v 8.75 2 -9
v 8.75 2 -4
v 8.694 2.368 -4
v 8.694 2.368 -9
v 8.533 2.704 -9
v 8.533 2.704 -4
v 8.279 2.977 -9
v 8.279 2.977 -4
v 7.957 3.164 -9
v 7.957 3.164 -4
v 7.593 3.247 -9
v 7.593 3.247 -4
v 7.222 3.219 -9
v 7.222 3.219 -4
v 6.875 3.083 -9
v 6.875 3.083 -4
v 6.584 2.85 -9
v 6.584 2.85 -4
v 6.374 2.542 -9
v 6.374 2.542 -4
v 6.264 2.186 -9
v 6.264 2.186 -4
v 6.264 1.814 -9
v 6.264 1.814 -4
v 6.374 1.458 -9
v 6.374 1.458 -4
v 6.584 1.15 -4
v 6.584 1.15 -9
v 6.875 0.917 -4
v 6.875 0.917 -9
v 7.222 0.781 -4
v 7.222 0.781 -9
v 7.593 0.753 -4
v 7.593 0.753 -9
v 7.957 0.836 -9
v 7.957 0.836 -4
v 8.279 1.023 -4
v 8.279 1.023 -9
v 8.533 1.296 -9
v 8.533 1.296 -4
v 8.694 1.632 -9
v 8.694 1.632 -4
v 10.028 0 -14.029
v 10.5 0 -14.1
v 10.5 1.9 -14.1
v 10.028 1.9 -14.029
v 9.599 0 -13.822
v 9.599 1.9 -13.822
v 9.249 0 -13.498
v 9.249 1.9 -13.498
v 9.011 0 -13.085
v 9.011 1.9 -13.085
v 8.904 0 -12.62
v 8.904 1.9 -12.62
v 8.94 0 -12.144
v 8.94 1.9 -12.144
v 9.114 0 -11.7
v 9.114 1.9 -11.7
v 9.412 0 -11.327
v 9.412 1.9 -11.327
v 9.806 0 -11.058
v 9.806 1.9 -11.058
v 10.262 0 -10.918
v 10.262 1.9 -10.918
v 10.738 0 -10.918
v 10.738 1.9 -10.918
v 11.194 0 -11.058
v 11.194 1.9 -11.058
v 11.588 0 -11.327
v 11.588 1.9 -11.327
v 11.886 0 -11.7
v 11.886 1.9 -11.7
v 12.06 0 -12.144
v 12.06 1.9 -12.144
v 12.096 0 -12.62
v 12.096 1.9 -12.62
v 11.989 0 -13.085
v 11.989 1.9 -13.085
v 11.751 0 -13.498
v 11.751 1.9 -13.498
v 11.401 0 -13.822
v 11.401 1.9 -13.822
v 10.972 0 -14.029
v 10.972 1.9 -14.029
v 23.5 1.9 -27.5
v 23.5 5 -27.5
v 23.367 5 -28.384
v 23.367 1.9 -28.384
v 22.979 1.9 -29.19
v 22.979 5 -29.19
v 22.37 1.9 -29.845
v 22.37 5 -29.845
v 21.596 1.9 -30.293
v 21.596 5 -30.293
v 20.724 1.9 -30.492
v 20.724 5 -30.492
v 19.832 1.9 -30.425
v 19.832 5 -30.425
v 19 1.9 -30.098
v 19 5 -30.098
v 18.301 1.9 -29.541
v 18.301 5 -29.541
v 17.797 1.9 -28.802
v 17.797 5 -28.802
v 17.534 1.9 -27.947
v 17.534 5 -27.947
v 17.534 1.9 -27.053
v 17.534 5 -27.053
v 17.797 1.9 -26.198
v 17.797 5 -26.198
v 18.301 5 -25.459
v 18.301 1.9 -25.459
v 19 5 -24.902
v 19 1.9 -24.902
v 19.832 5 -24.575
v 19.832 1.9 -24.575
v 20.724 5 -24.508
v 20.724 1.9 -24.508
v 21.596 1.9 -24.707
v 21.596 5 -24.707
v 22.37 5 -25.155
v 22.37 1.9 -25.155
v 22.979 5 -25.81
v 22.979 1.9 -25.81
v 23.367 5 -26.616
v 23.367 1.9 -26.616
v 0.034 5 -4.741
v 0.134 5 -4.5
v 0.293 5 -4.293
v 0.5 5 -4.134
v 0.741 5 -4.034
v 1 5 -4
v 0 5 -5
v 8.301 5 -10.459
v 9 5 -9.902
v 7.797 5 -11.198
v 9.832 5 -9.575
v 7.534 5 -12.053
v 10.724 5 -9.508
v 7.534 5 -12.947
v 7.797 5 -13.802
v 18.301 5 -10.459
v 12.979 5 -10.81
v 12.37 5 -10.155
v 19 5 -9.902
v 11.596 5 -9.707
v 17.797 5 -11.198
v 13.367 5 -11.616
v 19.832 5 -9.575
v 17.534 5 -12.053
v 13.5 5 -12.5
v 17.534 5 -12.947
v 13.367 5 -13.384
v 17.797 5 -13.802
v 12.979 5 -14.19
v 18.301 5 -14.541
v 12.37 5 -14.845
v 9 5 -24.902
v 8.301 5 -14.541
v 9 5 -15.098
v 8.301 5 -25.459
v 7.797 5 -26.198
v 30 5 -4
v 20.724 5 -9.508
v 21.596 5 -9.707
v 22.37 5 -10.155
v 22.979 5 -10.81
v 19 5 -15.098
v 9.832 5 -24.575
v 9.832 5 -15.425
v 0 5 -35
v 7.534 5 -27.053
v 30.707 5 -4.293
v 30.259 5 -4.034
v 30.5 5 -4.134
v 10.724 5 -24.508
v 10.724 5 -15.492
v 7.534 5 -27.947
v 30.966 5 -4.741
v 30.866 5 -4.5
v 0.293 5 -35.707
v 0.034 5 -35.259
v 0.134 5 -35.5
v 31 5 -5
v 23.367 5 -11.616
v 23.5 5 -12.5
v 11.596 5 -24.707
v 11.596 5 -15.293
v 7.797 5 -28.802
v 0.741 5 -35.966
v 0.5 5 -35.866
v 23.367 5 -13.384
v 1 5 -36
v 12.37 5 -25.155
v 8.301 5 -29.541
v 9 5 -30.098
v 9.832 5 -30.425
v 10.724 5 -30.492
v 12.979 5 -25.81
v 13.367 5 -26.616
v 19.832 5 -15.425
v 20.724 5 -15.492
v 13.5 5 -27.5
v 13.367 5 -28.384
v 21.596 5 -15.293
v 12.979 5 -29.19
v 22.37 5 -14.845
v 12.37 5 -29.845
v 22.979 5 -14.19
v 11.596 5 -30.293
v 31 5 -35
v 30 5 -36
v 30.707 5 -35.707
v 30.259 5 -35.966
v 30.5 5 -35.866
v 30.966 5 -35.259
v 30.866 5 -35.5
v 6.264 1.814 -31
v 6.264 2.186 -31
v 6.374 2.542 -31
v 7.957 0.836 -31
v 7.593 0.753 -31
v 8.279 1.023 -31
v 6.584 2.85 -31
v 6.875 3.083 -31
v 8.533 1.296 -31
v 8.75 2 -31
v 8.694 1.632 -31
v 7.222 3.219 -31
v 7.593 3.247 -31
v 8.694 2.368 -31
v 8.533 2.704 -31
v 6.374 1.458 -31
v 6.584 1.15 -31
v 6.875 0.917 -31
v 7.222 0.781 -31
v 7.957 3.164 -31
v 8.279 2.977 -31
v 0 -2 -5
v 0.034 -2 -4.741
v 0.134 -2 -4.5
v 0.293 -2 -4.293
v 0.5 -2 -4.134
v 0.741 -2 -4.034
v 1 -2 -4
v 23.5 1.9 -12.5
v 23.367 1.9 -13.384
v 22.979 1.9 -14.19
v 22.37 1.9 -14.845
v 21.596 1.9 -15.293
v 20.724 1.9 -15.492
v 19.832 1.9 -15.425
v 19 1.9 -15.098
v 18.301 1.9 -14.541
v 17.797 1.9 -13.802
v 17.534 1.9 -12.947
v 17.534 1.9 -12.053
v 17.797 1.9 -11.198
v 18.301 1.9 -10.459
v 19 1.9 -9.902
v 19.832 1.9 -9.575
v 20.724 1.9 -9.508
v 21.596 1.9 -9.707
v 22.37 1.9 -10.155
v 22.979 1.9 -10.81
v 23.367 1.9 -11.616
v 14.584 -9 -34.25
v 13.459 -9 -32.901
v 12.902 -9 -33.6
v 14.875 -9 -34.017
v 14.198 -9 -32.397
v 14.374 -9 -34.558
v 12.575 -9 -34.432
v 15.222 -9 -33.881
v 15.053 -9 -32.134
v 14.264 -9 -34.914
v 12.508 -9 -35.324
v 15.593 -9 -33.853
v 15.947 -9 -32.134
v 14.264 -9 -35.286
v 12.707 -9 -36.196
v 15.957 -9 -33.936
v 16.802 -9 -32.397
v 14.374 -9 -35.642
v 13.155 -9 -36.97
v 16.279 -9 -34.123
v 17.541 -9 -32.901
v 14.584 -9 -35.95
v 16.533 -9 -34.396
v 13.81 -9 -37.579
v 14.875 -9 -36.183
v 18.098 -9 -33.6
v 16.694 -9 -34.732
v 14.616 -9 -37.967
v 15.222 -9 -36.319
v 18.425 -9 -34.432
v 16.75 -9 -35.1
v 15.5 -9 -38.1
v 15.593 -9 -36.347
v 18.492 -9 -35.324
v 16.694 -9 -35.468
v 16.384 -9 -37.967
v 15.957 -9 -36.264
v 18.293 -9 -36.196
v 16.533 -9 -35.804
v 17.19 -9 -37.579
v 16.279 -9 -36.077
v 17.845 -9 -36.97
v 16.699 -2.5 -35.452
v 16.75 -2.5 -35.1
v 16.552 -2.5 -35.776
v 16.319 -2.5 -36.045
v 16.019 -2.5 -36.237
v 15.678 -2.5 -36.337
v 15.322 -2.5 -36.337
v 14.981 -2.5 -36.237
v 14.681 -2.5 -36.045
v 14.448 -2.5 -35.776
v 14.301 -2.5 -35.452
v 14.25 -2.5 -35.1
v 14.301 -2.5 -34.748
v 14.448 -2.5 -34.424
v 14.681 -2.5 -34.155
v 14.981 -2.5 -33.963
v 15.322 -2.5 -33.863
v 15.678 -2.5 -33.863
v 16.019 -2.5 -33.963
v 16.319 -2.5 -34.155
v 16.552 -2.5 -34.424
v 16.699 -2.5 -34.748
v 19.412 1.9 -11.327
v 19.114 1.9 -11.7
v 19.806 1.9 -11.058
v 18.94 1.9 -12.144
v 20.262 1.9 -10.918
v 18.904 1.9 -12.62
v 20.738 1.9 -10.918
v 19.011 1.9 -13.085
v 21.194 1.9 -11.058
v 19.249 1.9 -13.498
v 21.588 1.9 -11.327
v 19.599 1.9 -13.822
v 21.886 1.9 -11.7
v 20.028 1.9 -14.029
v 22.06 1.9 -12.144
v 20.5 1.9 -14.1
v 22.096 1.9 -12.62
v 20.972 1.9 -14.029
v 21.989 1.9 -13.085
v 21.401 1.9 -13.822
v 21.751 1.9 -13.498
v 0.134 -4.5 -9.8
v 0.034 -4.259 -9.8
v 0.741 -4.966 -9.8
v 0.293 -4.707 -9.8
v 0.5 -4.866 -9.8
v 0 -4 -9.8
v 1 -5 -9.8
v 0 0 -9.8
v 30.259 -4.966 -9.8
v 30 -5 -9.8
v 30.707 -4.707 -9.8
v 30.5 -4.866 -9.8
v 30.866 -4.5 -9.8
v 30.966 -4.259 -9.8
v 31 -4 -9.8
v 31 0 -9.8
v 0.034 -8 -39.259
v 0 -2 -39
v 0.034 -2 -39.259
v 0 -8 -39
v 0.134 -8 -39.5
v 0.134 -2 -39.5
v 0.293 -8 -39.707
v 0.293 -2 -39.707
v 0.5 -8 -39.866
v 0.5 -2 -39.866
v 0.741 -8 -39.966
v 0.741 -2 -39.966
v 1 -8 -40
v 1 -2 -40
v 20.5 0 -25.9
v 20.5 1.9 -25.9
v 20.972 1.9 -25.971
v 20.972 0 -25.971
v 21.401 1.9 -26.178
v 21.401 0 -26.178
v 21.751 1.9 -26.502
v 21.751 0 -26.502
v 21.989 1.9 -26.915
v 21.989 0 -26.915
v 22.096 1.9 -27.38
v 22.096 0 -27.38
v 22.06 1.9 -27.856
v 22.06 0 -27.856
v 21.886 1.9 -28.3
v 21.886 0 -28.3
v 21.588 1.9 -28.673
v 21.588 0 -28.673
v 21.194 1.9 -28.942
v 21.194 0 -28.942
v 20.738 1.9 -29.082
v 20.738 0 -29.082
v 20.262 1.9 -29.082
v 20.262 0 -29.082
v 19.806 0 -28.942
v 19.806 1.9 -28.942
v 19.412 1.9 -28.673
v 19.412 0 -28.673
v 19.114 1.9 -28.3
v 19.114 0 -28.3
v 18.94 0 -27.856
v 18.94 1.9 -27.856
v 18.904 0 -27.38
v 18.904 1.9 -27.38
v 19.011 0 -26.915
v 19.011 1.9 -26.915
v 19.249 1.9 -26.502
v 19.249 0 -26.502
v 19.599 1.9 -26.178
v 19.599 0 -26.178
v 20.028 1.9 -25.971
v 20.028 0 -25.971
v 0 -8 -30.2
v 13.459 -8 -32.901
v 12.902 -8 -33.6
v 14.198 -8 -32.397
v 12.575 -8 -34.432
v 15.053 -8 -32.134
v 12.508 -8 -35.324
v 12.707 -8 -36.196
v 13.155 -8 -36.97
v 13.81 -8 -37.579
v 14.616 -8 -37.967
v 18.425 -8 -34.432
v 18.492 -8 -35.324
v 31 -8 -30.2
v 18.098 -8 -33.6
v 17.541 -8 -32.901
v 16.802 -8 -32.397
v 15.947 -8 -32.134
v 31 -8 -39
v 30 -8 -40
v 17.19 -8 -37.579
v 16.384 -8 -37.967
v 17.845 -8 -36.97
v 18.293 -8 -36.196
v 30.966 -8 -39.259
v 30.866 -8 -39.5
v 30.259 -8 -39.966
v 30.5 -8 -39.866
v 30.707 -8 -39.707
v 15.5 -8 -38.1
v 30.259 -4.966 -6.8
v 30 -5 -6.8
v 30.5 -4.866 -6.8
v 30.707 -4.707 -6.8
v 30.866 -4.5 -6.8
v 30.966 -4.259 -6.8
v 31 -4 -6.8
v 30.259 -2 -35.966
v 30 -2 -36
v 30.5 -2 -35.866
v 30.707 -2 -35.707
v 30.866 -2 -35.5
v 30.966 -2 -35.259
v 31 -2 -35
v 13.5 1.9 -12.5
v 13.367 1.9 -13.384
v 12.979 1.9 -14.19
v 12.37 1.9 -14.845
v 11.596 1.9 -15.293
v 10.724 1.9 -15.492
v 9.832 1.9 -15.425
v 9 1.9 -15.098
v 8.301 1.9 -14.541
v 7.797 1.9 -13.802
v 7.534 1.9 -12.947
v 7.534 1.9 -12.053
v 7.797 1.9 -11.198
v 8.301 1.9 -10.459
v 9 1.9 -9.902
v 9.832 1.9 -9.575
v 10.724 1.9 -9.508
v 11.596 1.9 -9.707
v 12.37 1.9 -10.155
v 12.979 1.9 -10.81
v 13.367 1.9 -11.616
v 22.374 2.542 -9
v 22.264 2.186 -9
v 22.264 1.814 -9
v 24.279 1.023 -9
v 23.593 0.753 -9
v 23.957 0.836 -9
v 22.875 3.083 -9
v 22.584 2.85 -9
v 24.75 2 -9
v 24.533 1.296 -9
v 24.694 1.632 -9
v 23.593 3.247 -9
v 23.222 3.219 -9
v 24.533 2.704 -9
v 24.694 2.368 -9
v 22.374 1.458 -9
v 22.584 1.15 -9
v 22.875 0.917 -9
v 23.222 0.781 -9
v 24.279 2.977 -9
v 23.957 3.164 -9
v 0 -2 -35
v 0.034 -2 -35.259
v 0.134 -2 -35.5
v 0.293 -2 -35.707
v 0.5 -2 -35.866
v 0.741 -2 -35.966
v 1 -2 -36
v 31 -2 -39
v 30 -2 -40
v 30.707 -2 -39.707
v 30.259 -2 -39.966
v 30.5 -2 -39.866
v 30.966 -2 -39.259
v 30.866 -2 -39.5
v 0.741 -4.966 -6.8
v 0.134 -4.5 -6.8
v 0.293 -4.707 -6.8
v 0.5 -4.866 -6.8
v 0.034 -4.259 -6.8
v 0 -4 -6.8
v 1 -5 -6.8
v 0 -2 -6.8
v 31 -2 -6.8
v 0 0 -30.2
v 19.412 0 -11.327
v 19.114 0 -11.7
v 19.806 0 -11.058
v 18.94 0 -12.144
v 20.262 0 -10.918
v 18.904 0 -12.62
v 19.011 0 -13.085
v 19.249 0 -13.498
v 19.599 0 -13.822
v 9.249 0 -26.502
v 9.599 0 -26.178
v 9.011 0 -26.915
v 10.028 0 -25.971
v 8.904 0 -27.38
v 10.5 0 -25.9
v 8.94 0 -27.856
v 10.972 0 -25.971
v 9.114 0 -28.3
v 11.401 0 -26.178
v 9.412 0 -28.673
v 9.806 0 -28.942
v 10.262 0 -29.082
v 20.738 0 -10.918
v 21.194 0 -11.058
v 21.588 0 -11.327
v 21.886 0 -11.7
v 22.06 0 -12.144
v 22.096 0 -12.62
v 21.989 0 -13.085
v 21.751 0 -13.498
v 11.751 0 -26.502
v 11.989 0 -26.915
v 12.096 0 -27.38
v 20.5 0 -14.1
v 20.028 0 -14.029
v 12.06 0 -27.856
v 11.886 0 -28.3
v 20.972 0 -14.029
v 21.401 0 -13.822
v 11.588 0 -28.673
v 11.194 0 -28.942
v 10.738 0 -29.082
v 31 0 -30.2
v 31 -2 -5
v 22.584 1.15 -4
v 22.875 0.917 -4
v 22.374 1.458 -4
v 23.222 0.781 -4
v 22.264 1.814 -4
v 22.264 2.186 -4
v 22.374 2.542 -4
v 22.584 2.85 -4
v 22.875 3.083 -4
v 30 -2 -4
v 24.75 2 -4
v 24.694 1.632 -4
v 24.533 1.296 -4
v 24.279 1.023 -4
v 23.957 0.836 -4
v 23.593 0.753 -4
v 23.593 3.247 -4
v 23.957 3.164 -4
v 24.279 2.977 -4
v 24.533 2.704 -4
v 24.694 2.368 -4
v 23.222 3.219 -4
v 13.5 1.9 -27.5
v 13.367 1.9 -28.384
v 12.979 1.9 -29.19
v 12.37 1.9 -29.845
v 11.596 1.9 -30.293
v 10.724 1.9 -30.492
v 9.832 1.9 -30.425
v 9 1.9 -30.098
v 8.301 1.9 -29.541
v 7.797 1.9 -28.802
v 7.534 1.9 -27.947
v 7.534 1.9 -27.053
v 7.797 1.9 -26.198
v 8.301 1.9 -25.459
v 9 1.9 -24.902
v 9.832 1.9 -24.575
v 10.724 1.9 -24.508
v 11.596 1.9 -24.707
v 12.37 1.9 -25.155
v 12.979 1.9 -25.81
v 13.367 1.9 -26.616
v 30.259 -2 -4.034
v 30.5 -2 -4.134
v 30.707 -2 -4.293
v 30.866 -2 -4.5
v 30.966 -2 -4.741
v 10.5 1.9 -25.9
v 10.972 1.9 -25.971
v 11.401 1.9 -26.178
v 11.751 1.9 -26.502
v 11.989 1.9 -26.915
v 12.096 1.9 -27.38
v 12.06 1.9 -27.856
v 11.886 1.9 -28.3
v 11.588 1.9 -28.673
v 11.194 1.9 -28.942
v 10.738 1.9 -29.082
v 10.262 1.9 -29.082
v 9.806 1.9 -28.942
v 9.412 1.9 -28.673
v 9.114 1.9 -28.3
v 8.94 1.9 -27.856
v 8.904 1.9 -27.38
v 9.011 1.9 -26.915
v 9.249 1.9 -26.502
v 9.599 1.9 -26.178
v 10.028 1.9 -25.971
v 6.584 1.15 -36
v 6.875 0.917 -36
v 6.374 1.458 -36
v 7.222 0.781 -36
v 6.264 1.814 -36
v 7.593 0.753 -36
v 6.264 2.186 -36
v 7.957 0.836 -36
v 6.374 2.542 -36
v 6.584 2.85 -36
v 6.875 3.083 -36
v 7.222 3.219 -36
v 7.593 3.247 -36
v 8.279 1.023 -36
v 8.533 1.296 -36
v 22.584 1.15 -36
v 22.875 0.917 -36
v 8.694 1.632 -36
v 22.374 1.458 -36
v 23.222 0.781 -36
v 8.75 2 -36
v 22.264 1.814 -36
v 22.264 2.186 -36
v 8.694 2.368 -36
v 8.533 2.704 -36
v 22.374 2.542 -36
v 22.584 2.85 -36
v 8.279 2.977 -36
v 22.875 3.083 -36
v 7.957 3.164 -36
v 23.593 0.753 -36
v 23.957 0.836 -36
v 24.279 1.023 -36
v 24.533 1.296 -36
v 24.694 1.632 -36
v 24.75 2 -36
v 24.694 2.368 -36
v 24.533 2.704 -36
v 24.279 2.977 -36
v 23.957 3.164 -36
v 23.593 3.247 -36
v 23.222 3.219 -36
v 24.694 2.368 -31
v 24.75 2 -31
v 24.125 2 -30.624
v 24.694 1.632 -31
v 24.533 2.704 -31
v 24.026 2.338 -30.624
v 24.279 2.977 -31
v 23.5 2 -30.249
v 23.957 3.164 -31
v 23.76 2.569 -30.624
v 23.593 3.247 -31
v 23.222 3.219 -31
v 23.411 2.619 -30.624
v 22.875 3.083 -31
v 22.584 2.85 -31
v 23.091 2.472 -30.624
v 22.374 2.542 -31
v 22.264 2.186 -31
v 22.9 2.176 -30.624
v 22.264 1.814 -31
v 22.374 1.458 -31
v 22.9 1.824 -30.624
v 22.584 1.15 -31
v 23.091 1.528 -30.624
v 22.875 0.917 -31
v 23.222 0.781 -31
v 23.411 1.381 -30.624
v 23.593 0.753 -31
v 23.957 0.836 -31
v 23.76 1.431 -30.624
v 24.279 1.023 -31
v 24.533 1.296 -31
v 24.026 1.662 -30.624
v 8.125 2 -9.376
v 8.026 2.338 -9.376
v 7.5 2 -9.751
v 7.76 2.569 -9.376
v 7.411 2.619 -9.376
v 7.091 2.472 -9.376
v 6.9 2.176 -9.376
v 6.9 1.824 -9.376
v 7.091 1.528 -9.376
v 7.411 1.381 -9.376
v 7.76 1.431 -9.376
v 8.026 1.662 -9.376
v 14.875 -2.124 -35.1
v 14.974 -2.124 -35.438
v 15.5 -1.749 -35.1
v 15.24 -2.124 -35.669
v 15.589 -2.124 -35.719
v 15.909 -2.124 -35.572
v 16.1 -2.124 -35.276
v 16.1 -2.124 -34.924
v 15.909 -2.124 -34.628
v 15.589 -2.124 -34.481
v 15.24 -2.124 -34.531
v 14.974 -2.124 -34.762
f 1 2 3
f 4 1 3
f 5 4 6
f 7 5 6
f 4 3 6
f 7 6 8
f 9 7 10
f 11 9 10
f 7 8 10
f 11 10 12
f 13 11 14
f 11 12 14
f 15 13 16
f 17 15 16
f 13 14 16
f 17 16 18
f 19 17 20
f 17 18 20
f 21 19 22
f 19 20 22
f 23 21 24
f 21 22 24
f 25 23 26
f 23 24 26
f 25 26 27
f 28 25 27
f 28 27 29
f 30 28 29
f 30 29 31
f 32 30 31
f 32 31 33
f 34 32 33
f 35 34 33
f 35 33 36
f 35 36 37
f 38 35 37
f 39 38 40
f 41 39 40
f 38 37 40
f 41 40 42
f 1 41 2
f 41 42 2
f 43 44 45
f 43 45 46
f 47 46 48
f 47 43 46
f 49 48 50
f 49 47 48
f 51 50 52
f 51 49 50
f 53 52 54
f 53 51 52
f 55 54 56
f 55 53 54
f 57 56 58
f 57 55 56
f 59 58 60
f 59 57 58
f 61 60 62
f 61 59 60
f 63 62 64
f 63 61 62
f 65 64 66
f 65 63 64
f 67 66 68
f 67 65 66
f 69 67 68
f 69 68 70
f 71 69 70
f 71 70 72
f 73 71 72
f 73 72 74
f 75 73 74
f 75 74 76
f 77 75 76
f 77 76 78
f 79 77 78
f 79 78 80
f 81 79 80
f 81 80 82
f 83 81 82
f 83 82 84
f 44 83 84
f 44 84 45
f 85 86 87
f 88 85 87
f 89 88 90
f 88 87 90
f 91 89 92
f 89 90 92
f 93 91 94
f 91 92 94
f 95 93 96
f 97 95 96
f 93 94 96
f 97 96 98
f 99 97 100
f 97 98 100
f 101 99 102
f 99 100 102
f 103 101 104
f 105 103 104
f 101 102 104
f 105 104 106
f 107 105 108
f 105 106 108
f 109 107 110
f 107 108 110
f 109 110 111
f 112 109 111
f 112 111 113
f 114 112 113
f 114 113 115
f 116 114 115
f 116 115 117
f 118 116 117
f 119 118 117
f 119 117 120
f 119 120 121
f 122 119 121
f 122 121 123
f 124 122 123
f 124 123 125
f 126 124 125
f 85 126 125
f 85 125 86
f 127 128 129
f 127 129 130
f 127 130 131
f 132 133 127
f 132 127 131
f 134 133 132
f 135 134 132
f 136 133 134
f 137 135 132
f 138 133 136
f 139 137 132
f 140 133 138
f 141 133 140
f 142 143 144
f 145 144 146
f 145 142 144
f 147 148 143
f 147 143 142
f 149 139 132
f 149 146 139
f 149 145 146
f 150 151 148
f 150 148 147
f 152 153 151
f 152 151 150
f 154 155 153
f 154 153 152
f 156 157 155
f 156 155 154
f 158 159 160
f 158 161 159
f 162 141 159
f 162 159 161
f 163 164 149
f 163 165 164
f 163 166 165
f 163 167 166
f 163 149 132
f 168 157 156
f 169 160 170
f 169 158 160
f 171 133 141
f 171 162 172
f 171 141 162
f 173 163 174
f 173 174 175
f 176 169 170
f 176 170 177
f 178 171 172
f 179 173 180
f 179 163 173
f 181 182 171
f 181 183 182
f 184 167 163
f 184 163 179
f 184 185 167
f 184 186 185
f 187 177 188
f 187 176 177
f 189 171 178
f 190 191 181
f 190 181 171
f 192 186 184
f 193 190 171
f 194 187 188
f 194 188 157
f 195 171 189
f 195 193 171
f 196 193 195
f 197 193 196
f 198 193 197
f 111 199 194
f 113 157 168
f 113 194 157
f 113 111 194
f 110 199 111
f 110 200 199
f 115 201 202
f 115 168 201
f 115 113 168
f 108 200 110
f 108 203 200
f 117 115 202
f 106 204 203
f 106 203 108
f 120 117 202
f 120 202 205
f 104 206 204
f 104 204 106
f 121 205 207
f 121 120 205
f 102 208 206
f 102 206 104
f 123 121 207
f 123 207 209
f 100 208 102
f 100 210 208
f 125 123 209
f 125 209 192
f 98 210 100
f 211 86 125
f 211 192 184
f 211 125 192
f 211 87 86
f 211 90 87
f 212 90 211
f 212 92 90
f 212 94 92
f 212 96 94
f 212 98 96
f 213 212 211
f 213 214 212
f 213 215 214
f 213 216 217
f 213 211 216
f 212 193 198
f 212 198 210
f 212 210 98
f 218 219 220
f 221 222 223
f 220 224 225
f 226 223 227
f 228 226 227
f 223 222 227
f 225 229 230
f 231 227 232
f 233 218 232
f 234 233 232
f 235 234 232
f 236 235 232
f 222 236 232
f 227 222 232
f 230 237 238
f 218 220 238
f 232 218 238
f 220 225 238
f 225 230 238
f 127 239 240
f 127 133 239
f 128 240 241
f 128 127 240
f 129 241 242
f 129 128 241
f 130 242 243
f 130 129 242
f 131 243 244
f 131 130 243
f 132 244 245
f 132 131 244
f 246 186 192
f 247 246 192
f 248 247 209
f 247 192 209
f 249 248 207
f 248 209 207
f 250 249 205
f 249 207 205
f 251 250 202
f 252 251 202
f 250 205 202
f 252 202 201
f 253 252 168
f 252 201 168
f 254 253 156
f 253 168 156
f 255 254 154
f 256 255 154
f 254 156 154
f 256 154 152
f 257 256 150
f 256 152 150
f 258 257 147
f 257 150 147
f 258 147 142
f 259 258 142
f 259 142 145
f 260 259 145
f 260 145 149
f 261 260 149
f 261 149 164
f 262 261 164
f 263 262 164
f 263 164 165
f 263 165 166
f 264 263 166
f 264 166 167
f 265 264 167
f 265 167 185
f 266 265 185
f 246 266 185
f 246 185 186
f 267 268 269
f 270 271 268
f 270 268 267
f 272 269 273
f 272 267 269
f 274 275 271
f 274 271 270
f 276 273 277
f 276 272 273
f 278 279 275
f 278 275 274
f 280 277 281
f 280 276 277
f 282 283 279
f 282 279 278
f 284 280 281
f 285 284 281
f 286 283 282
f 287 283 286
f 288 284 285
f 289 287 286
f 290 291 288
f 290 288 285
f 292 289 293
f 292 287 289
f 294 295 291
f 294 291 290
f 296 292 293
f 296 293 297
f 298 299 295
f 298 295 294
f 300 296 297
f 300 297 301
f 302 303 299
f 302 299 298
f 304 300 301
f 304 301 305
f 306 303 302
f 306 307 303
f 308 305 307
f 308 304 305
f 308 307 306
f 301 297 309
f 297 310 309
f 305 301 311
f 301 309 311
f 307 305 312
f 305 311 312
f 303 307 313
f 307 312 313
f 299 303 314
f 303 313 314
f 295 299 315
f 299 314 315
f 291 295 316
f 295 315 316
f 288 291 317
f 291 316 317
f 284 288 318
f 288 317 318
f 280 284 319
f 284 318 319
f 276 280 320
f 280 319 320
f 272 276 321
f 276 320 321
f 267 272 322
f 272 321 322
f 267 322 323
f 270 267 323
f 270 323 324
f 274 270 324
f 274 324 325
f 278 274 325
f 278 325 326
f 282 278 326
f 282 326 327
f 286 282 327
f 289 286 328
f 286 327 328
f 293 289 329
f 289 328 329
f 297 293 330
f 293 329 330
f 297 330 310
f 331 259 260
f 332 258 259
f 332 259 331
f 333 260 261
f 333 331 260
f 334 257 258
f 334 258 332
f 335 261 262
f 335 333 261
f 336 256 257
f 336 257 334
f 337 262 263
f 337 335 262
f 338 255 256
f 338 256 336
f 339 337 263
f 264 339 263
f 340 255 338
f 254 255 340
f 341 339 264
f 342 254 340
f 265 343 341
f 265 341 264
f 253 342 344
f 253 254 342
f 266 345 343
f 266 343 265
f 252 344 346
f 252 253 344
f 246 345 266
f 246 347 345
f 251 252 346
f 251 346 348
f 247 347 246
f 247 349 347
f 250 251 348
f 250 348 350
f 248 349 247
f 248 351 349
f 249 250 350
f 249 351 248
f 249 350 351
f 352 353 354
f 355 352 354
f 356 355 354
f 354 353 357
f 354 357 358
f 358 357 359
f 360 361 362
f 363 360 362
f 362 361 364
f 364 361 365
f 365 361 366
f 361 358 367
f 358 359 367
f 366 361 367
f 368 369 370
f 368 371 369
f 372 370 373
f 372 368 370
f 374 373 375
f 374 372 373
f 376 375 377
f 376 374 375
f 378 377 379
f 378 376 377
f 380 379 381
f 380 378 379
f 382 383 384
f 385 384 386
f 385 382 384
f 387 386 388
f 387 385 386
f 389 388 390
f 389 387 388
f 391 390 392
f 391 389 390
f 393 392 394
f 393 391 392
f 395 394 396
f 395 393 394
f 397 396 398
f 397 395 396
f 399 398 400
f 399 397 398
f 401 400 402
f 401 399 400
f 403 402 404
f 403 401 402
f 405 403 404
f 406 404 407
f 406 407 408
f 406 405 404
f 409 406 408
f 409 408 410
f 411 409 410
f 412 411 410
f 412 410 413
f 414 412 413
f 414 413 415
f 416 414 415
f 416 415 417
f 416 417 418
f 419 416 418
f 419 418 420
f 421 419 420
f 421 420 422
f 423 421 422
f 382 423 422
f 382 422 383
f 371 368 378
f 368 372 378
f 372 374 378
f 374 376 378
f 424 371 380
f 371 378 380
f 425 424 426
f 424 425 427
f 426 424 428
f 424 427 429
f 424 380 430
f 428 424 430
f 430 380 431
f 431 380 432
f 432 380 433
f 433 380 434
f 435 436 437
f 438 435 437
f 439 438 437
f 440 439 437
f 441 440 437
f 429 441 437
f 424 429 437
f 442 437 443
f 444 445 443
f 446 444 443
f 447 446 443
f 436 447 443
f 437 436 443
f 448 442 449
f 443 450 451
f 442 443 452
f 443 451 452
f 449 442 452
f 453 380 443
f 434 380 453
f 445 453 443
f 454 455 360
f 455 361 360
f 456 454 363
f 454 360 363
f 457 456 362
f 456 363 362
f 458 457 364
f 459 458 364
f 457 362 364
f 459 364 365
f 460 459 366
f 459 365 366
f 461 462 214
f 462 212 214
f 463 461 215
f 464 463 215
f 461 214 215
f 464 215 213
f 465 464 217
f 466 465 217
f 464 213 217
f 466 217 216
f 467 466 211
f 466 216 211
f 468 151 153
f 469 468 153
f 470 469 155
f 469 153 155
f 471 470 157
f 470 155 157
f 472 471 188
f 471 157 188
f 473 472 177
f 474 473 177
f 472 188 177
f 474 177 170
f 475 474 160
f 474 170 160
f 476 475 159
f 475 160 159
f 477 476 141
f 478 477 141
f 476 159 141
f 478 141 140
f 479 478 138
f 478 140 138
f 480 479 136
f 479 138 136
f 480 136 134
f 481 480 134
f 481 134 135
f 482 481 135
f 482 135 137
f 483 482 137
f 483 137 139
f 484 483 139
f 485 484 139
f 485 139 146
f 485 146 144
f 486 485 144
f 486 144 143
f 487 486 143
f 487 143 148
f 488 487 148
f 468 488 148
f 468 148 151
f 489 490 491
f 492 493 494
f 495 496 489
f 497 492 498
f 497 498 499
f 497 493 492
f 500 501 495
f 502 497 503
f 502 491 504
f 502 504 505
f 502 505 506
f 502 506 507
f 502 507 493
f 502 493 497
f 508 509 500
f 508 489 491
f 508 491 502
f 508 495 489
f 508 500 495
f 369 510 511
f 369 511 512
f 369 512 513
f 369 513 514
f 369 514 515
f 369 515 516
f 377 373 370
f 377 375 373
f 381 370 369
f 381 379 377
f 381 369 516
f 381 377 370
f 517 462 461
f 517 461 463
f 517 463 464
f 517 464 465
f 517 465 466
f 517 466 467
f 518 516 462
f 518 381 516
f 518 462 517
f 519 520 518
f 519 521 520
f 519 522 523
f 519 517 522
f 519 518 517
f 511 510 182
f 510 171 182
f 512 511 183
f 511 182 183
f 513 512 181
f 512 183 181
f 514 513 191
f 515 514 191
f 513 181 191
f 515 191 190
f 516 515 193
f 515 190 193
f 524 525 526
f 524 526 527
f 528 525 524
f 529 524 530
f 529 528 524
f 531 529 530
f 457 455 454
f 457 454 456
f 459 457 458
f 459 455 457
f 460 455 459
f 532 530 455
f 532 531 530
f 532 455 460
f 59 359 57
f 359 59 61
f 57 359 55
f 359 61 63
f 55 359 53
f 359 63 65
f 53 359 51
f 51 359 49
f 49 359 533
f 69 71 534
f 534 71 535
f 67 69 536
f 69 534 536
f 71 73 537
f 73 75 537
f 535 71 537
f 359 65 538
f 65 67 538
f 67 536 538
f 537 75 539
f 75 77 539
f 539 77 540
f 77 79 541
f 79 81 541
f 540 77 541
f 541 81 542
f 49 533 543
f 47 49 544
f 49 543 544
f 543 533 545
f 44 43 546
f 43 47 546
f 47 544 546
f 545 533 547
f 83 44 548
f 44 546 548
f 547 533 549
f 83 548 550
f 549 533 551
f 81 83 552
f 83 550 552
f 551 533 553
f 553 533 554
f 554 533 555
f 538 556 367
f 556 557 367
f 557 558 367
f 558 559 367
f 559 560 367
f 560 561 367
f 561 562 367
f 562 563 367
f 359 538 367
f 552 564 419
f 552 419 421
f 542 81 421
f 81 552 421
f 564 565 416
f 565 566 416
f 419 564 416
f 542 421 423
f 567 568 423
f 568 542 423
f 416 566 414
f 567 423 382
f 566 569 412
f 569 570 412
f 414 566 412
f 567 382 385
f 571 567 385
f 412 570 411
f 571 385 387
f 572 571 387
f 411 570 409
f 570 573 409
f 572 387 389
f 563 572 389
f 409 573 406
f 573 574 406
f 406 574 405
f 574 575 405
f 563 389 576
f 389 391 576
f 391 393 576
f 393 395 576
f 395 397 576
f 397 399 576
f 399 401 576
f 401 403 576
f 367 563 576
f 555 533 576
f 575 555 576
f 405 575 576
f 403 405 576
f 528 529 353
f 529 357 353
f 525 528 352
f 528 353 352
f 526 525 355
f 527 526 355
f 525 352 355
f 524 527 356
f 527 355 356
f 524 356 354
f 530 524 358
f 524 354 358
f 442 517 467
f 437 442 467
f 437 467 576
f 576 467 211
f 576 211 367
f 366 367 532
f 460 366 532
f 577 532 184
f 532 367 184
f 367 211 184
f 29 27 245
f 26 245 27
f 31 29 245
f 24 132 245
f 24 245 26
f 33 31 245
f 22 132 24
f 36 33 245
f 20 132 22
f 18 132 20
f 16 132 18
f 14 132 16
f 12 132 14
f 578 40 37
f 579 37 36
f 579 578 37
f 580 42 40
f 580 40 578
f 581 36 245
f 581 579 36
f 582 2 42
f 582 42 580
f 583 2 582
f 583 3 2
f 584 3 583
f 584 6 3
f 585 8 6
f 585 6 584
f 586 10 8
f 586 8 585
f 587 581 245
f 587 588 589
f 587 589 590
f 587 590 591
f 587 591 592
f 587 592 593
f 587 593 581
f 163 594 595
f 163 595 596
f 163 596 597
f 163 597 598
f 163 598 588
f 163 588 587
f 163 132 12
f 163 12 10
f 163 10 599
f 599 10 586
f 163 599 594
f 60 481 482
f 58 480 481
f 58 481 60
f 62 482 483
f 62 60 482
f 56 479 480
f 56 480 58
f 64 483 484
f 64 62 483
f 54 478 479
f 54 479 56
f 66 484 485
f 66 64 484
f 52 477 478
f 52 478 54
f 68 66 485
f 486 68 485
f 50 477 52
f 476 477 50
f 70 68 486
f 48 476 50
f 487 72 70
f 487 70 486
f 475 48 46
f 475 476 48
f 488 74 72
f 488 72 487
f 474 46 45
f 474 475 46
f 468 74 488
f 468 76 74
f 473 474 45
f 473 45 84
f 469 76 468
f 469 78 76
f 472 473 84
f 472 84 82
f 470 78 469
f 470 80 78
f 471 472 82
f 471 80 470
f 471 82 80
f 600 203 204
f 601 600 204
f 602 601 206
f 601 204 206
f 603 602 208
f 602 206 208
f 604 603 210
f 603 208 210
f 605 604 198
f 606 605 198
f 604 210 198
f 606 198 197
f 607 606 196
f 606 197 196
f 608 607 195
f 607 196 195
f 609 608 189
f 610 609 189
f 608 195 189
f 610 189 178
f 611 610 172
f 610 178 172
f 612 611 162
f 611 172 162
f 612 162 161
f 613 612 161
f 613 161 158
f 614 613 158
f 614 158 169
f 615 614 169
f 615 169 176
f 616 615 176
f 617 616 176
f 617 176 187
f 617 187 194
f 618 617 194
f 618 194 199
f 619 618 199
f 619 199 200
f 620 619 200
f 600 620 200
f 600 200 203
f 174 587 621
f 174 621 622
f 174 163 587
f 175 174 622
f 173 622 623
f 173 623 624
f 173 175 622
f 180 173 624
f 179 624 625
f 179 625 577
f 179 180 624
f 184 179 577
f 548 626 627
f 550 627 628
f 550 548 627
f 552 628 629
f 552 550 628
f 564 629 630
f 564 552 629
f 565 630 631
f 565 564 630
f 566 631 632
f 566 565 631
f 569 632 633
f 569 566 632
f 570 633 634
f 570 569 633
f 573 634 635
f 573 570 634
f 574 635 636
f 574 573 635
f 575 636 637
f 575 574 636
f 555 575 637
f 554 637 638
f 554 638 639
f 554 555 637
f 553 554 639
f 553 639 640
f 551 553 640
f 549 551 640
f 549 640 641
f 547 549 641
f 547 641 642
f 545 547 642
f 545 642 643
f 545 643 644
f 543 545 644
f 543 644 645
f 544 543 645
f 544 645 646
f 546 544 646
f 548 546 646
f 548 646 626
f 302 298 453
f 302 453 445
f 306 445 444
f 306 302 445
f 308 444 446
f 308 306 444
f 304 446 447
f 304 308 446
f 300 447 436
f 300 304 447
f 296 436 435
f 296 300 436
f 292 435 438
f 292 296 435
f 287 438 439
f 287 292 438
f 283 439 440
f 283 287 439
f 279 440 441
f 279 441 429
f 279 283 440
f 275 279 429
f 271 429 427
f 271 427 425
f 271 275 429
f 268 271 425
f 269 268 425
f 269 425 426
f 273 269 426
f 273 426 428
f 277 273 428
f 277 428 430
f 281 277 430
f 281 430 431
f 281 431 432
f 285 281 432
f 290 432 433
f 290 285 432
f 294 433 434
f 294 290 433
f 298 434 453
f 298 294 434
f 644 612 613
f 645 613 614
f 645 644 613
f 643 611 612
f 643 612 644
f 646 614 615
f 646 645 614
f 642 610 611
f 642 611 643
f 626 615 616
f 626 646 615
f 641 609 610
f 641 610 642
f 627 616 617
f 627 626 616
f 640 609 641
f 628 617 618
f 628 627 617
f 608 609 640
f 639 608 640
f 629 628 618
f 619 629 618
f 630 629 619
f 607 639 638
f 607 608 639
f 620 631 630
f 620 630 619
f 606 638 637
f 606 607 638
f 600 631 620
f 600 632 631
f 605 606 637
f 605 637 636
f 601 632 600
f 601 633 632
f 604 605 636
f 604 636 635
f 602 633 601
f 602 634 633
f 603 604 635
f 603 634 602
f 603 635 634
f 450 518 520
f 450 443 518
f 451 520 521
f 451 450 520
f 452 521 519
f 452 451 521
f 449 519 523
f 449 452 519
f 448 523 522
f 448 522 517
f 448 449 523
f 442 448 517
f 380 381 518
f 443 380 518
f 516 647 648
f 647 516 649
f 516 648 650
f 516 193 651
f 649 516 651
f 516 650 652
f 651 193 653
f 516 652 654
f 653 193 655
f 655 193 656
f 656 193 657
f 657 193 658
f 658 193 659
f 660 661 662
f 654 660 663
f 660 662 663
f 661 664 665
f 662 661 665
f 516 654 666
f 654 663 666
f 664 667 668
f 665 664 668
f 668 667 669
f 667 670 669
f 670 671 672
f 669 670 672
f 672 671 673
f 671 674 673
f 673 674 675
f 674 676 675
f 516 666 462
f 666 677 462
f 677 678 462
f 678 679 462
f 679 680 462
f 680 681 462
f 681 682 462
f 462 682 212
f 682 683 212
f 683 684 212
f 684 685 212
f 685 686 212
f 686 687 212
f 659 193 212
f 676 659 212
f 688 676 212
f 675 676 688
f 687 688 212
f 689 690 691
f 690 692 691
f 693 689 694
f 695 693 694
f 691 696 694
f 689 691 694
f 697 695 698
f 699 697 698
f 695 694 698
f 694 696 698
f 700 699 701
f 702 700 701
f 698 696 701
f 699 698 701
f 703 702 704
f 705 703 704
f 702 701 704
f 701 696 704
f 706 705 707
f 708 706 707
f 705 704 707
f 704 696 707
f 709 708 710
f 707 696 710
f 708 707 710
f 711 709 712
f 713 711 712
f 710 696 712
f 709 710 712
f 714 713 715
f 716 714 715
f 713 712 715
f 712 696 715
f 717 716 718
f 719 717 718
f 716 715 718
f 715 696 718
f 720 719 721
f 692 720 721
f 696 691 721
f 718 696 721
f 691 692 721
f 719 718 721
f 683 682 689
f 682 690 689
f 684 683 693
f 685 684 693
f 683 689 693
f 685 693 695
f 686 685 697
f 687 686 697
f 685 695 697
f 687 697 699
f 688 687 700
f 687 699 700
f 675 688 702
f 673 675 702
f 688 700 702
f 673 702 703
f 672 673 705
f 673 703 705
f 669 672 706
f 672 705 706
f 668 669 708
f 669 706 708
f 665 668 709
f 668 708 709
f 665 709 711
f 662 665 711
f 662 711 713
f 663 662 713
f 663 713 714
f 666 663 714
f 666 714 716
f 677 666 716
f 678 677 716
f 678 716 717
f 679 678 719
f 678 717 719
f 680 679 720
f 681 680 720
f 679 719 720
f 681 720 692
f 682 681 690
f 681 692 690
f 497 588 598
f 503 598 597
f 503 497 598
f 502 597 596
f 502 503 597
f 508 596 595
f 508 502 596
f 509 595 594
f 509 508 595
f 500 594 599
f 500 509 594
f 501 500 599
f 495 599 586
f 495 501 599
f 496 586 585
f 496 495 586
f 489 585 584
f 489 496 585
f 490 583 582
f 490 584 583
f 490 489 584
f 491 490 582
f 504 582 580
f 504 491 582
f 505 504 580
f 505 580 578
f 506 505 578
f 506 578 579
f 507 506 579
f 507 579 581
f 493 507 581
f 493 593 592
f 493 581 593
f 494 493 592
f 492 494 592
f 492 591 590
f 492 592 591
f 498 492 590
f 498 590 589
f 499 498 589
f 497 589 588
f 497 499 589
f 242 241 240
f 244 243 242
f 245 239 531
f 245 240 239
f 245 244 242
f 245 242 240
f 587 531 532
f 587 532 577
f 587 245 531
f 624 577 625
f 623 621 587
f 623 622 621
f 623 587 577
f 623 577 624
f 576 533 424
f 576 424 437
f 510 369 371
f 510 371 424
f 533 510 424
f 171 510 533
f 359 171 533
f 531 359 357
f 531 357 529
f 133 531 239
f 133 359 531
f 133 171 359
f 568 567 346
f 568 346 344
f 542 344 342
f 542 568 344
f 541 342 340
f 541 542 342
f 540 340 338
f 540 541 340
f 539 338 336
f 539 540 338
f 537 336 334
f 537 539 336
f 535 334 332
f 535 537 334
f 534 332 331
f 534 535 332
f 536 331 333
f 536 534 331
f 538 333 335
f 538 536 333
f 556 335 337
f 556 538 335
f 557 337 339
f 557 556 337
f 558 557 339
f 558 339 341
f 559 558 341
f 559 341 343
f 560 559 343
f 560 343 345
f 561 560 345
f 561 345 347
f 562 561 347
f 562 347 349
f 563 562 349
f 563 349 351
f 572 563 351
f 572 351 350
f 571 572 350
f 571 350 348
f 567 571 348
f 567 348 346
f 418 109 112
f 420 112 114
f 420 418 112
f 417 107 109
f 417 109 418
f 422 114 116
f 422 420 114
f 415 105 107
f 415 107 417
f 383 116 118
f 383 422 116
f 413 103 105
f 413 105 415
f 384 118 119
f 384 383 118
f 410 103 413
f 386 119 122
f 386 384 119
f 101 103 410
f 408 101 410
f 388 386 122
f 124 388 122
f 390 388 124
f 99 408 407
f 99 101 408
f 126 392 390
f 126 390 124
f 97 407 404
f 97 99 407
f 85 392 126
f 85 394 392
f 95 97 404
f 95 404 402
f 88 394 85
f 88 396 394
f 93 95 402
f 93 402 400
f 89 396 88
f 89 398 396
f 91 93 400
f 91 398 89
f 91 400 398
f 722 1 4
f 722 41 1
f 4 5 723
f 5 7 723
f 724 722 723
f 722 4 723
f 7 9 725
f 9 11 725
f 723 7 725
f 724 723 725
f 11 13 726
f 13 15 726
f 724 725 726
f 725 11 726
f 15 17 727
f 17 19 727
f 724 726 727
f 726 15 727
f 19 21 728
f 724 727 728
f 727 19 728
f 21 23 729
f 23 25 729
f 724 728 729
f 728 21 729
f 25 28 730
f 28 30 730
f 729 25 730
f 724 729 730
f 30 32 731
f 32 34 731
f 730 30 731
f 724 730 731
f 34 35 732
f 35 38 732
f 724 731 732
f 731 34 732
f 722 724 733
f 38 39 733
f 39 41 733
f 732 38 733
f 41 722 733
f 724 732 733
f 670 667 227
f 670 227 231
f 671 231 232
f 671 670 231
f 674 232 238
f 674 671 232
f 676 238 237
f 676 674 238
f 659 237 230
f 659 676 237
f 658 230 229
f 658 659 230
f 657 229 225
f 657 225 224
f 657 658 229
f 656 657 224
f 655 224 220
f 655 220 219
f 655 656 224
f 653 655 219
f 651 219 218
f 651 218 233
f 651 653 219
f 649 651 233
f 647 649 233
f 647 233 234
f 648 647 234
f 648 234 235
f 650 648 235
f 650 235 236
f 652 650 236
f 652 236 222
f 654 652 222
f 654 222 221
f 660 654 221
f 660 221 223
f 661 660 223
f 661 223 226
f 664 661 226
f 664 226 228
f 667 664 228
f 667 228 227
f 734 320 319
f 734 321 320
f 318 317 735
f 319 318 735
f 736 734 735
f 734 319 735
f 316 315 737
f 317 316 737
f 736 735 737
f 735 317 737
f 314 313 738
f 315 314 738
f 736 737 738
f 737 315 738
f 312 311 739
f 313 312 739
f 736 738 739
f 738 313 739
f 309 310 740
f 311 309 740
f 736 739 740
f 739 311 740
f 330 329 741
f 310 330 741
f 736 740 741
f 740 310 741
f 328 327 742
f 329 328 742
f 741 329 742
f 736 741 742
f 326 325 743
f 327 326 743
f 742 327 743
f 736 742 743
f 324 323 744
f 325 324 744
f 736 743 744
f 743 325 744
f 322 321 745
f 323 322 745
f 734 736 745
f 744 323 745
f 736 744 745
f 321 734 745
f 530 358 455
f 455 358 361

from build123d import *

# Parameters (mm, degrees)
SKETCH_1_W                     = 31
SKETCH_1_H                     = 40
SKETCH_1_R                     = 1.6
EXTRUDE_1_DEPTH                = 5
SKETCH_2_W                     = 31
SKETCH_2_H                     = 9.8
EXTRUDE_3_DEPTH                = 8
SKETCH_13_R                    = 1
CUT_EXTRUDE_7_DEPTH            = 5
EXTRUDE_START                  = 1
SKETCH_14_R                    = 3
SKETCH_14_R_2                  = 1
EXTRUDE_8_DEPTH                = 1
HOLE_WIZARD_M3_3_D             = 2.5
HOLE_WIZARD_M3_3_DEPTH         = 6.5
HOLE_WIZARD_M3_3_TIP           = 0.751075774
SKETCH_18_W                    = 31
SKETCH_18_H                    = 3
EXTRUDE_9_DEPTH                = 10
SKETCH_29_W                    = 31
SKETCH_29_H                    = 6.8
EXTRUDE_11_DEPTH               = 2
SKETCH_20_R                    = 1
CUT_EXTRUDE_9_DEPTH            = 9
HOLE_START                     = -9
HOLE_WIZARD_M3_1_OUTLINE_R     = 1.25
HOLE_WIZARD_M3_1_OUTLINE_R_2   = 1
HOLE_WIZARD_M3_1_DEPTH         = 9
HOLE_WIZARD_M3_1_3_D           = 3.2
HOLE_WIZARD_M3_1_3_CBORE_D     = 6
HOLE_WIZARD_M3_1_3_CBORE_DEPTH = 3.1
HOLE_START_2                   = -40
HOLE_WIZARD_M3_2_OUTLINE_R     = 1.25
HOLE_WIZARD_M3_2_OUTLINE_R_2   = 1
HOLE_WIZARD_M3_2_DEPTH         = 9
SKETCH_30_W                    = 31
SKETCH_30_H                    = 7
CUT_EXTRUDE_10_DEPTH           = 4
FILLET_3_R                     = 1


# Read off the part's stored shape, not the designer's step: M3 螺纹孔1, M3 螺纹孔2
with BuildPart() as part:
    # 草图1 → 凸台-拉伸1 (new body)
    with BuildSketch(Plane(origin=(0, 0, 0), x_dir=(1, 0, 0), z_dir=(0, 1, 0))):
        with Locations((15.5, 20)):
            Rectangle(SKETCH_1_W, SKETCH_1_H)
        with Locations(Location((20.5, 27.5, 0), (0, 0, 270))):
            Circle(SKETCH_1_R, mode=Mode.SUBTRACT)
        with Locations(Location((10.5, 27.5, 0), (0, 0, 270))):
            Circle(SKETCH_1_R, mode=Mode.SUBTRACT)
        with Locations(Location((10.5, 12.5, 0), (0, 0, 90))):
            Circle(SKETCH_1_R, mode=Mode.SUBTRACT)
        with Locations(Location((20.5, 12.5, 0), (0, 0, 90))):
            Circle(SKETCH_1_R, mode=Mode.SUBTRACT)
    extrude(amount=EXTRUDE_1_DEPTH)

    # 草图2 → 凸台-拉伸3 (add)
    with BuildSketch(Plane(origin=(0, 0, 0), x_dir=(1, 0, 0), z_dir=(0, 1, 0))):
        with Locations((15.5, 35.1)):
            Rectangle(SKETCH_2_W, SKETCH_2_H)
    extrude(amount=-EXTRUDE_3_DEPTH)

    # 草图13 → 切除-拉伸7 (cut)
    with BuildSketch(Plane.XZ.offset(8)):
        with Locations(Location((15.5, -35.1, 0), (0, 0, 270))):
            Circle(SKETCH_13_R)
    extrude(amount=-CUT_EXTRUDE_7_DEPTH, mode=Mode.SUBTRACT)

    # 草图14 → 凸台-拉伸8 (add)
    with BuildSketch(Plane.XZ.offset(8).offset(EXTRUDE_START)):
        with Locations(Location((15.5, -35.1, 0), (0, 0, 270))):
            Circle(SKETCH_14_R)
        with Locations(Location((15.5, -35.1, 0), (0, 0, 270))):
            Circle(SKETCH_14_R_2, mode=Mode.SUBTRACT)
    extrude(amount=-EXTRUDE_8_DEPTH)

    # M3 螺纹孔3
    with Locations(Plane(origin=(0, -9, 0), x_dir=(-1, 0, 0), z_dir=(0, -1, 0))):
        with Locations((-15.5, 35.1)):
            Hole(HOLE_WIZARD_M3_3_D / 2, depth=HOLE_WIZARD_M3_3_DEPTH)
            with Locations((0, 0, -(HOLE_WIZARD_M3_3_DEPTH + HOLE_WIZARD_M3_3_TIP / 2))):  # 118° drill point
                Cone(0, HOLE_WIZARD_M3_3_D / 2, HOLE_WIZARD_M3_3_TIP, mode=Mode.SUBTRACT)

    # 草图18 → 凸台-拉伸9 (add)
    with BuildSketch(Plane(origin=(0, 5, 0), x_dir=(1, 0, 0), z_dir=(0, 1, 0))):
        with Locations((15.5, 8.3)):
            Rectangle(SKETCH_18_W, SKETCH_18_H)
    extrude(amount=-EXTRUDE_9_DEPTH)

    # 草图29 → 凸台-拉伸11 (add)
    with BuildSketch(Plane.XZ):
        with Locations((15.5, -3.4)):
            Rectangle(SKETCH_29_W, SKETCH_29_H)
    extrude(amount=EXTRUDE_11_DEPTH)

    # 草图20 → 切除-拉伸9 (cut)
    with BuildSketch(Plane.XY):
        with Locations((7.5, 2)):
            Circle(SKETCH_20_R)
        with Locations(Location((23.5, 2, 0), (0, 0, 180))):
            Circle(SKETCH_20_R)
    cut_extrude_9 = extrude(amount=-CUT_EXTRUDE_9_DEPTH, mode=Mode.SUBTRACT)

    # Hole Wizard M3 _1 outline → Hole Wizard M3 _1 (cut)
    with BuildSketch(Plane.XY.offset(HOLE_START)):
        with Locations((23.5, 2)):
            Circle(HOLE_WIZARD_M3_1_OUTLINE_R)
        with Locations((23.5, 2)):
            Circle(HOLE_WIZARD_M3_1_OUTLINE_R_2, mode=Mode.SUBTRACT)
    extrude(amount=HOLE_WIZARD_M3_1_DEPTH, mode=Mode.SUBTRACT)

    # Hole Wizard M3 _1 2 outline → Hole Wizard M3 _1 2 (revolve, cut)
    with BuildSketch(Plane(origin=(7.5, 2, 0), x_dir=(1, 0, 0), z_dir=(0, -1, 0))):
        Polygon((0, -9), (0, -9.751075774), (1.25, -9), (1.25, 0), (1, 0), (1, -9), align=None)
    revolve(axis=Axis((7.5, 2, 0), (0, 0, 1)), mode=Mode.SUBTRACT)

    # 镜向1: 切除-拉伸9 across plane
    add(cut_extrude_9.mirror(Plane.XY.offset(-20)), mode=Mode.SUBTRACT)

    # Hole Wizard M3 _1 3 (through all)
    with Locations(Plane(origin=(0, 5, 0), x_dir=(1, 0, 0), z_dir=(0, 1, 0))):
        with Locations((10.5, 27.5), (10.5, 12.5), (20.5, 12.5), (20.5, 27.5)):
            CounterBoreHole(HOLE_WIZARD_M3_1_3_D / 2, HOLE_WIZARD_M3_1_3_CBORE_D / 2, HOLE_WIZARD_M3_1_3_CBORE_DEPTH)

    # M3 螺纹孔2 outline → M3 螺纹孔2 (cut)
    with BuildSketch(Plane.XY.offset(HOLE_START_2)):
        with Locations((7.5, 2)):
            Circle(HOLE_WIZARD_M3_2_OUTLINE_R)
        with Locations((7.5, 2)):
            Circle(HOLE_WIZARD_M3_2_OUTLINE_R_2, mode=Mode.SUBTRACT)
    extrude(amount=HOLE_WIZARD_M3_2_DEPTH, mode=Mode.SUBTRACT)

    # Hole Wizard M3 _2 2 outline → Hole Wizard M3 _2 2 (revolve, cut)
    with BuildSketch(Plane(origin=(23.5, 2, 0), x_dir=(1, 0, 0), z_dir=(0, -1, 0))):
        Polygon((1.25, -31), (0, -30.248924226), (0, -31), (1, -31), (1, -40), (1.25, -40), align=None)
    revolve(axis=Axis((23.5, 2, 0), (0, 0, 1)), mode=Mode.SUBTRACT)

    # 草图30 → 切除-拉伸10 (cut)
    with BuildSketch(Plane.XY):
        with Locations((15.5, 1.5)):
            Rectangle(SKETCH_30_W, SKETCH_30_H)
    cut_extrude_10 = extrude(amount=-CUT_EXTRUDE_10_DEPTH, mode=Mode.SUBTRACT)

    # 镜向3: 切除-拉伸10 across plane
    add(cut_extrude_10.mirror(Plane.XY.offset(-20)), mode=Mode.SUBTRACT)

    # 圆角3
    fillet_3_edges = [part.edges().sort_by_distance(p)[0] for p in [
        (31, 1.5, -4),
        (0, 1.5, -4),
        (31, -5, -40),
        (0, -5, -40),
        (0, 1.5, -36),
        (31, 1.5, -36),
        (31, -5, -8.3),
        (0, -5, -8.3),
    ]]
    fillet(fillet_3_edges, radius=FILLET_3_R)


solid = part.part
